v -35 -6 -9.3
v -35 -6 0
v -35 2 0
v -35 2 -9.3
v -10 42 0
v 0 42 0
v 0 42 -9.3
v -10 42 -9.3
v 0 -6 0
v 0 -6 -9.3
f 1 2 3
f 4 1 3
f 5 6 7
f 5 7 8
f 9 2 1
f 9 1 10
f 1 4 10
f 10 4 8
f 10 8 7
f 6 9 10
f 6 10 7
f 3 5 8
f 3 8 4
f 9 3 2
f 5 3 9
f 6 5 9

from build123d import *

# Parameters (mm, degrees)
BOSS_EXTRUDE1_DEPTH = 9.3
SKETCH2_W           = 35
SKETCH2_H           = 6
BOSS_EXTRUDE2_DEPTH = 9.3


with BuildPart() as part:
    # Sketch1 → Boss-Extrude1 (new body)
    with BuildSketch(Plane.XY):
        Polygon((0, 0), (0, 42), (-10, 42), (-35, 2), (-35, 0), align=None)
    extrude(amount=-BOSS_EXTRUDE1_DEPTH)

    # Sketch2 → Boss-Extrude2 (add)
    with BuildSketch(Plane.XY):
        with Locations((-17.5, -3)):
            Rectangle(SKETCH2_W, SKETCH2_H)
    extrude(amount=-BOSS_EXTRUDE2_DEPTH)


solid = part.part
